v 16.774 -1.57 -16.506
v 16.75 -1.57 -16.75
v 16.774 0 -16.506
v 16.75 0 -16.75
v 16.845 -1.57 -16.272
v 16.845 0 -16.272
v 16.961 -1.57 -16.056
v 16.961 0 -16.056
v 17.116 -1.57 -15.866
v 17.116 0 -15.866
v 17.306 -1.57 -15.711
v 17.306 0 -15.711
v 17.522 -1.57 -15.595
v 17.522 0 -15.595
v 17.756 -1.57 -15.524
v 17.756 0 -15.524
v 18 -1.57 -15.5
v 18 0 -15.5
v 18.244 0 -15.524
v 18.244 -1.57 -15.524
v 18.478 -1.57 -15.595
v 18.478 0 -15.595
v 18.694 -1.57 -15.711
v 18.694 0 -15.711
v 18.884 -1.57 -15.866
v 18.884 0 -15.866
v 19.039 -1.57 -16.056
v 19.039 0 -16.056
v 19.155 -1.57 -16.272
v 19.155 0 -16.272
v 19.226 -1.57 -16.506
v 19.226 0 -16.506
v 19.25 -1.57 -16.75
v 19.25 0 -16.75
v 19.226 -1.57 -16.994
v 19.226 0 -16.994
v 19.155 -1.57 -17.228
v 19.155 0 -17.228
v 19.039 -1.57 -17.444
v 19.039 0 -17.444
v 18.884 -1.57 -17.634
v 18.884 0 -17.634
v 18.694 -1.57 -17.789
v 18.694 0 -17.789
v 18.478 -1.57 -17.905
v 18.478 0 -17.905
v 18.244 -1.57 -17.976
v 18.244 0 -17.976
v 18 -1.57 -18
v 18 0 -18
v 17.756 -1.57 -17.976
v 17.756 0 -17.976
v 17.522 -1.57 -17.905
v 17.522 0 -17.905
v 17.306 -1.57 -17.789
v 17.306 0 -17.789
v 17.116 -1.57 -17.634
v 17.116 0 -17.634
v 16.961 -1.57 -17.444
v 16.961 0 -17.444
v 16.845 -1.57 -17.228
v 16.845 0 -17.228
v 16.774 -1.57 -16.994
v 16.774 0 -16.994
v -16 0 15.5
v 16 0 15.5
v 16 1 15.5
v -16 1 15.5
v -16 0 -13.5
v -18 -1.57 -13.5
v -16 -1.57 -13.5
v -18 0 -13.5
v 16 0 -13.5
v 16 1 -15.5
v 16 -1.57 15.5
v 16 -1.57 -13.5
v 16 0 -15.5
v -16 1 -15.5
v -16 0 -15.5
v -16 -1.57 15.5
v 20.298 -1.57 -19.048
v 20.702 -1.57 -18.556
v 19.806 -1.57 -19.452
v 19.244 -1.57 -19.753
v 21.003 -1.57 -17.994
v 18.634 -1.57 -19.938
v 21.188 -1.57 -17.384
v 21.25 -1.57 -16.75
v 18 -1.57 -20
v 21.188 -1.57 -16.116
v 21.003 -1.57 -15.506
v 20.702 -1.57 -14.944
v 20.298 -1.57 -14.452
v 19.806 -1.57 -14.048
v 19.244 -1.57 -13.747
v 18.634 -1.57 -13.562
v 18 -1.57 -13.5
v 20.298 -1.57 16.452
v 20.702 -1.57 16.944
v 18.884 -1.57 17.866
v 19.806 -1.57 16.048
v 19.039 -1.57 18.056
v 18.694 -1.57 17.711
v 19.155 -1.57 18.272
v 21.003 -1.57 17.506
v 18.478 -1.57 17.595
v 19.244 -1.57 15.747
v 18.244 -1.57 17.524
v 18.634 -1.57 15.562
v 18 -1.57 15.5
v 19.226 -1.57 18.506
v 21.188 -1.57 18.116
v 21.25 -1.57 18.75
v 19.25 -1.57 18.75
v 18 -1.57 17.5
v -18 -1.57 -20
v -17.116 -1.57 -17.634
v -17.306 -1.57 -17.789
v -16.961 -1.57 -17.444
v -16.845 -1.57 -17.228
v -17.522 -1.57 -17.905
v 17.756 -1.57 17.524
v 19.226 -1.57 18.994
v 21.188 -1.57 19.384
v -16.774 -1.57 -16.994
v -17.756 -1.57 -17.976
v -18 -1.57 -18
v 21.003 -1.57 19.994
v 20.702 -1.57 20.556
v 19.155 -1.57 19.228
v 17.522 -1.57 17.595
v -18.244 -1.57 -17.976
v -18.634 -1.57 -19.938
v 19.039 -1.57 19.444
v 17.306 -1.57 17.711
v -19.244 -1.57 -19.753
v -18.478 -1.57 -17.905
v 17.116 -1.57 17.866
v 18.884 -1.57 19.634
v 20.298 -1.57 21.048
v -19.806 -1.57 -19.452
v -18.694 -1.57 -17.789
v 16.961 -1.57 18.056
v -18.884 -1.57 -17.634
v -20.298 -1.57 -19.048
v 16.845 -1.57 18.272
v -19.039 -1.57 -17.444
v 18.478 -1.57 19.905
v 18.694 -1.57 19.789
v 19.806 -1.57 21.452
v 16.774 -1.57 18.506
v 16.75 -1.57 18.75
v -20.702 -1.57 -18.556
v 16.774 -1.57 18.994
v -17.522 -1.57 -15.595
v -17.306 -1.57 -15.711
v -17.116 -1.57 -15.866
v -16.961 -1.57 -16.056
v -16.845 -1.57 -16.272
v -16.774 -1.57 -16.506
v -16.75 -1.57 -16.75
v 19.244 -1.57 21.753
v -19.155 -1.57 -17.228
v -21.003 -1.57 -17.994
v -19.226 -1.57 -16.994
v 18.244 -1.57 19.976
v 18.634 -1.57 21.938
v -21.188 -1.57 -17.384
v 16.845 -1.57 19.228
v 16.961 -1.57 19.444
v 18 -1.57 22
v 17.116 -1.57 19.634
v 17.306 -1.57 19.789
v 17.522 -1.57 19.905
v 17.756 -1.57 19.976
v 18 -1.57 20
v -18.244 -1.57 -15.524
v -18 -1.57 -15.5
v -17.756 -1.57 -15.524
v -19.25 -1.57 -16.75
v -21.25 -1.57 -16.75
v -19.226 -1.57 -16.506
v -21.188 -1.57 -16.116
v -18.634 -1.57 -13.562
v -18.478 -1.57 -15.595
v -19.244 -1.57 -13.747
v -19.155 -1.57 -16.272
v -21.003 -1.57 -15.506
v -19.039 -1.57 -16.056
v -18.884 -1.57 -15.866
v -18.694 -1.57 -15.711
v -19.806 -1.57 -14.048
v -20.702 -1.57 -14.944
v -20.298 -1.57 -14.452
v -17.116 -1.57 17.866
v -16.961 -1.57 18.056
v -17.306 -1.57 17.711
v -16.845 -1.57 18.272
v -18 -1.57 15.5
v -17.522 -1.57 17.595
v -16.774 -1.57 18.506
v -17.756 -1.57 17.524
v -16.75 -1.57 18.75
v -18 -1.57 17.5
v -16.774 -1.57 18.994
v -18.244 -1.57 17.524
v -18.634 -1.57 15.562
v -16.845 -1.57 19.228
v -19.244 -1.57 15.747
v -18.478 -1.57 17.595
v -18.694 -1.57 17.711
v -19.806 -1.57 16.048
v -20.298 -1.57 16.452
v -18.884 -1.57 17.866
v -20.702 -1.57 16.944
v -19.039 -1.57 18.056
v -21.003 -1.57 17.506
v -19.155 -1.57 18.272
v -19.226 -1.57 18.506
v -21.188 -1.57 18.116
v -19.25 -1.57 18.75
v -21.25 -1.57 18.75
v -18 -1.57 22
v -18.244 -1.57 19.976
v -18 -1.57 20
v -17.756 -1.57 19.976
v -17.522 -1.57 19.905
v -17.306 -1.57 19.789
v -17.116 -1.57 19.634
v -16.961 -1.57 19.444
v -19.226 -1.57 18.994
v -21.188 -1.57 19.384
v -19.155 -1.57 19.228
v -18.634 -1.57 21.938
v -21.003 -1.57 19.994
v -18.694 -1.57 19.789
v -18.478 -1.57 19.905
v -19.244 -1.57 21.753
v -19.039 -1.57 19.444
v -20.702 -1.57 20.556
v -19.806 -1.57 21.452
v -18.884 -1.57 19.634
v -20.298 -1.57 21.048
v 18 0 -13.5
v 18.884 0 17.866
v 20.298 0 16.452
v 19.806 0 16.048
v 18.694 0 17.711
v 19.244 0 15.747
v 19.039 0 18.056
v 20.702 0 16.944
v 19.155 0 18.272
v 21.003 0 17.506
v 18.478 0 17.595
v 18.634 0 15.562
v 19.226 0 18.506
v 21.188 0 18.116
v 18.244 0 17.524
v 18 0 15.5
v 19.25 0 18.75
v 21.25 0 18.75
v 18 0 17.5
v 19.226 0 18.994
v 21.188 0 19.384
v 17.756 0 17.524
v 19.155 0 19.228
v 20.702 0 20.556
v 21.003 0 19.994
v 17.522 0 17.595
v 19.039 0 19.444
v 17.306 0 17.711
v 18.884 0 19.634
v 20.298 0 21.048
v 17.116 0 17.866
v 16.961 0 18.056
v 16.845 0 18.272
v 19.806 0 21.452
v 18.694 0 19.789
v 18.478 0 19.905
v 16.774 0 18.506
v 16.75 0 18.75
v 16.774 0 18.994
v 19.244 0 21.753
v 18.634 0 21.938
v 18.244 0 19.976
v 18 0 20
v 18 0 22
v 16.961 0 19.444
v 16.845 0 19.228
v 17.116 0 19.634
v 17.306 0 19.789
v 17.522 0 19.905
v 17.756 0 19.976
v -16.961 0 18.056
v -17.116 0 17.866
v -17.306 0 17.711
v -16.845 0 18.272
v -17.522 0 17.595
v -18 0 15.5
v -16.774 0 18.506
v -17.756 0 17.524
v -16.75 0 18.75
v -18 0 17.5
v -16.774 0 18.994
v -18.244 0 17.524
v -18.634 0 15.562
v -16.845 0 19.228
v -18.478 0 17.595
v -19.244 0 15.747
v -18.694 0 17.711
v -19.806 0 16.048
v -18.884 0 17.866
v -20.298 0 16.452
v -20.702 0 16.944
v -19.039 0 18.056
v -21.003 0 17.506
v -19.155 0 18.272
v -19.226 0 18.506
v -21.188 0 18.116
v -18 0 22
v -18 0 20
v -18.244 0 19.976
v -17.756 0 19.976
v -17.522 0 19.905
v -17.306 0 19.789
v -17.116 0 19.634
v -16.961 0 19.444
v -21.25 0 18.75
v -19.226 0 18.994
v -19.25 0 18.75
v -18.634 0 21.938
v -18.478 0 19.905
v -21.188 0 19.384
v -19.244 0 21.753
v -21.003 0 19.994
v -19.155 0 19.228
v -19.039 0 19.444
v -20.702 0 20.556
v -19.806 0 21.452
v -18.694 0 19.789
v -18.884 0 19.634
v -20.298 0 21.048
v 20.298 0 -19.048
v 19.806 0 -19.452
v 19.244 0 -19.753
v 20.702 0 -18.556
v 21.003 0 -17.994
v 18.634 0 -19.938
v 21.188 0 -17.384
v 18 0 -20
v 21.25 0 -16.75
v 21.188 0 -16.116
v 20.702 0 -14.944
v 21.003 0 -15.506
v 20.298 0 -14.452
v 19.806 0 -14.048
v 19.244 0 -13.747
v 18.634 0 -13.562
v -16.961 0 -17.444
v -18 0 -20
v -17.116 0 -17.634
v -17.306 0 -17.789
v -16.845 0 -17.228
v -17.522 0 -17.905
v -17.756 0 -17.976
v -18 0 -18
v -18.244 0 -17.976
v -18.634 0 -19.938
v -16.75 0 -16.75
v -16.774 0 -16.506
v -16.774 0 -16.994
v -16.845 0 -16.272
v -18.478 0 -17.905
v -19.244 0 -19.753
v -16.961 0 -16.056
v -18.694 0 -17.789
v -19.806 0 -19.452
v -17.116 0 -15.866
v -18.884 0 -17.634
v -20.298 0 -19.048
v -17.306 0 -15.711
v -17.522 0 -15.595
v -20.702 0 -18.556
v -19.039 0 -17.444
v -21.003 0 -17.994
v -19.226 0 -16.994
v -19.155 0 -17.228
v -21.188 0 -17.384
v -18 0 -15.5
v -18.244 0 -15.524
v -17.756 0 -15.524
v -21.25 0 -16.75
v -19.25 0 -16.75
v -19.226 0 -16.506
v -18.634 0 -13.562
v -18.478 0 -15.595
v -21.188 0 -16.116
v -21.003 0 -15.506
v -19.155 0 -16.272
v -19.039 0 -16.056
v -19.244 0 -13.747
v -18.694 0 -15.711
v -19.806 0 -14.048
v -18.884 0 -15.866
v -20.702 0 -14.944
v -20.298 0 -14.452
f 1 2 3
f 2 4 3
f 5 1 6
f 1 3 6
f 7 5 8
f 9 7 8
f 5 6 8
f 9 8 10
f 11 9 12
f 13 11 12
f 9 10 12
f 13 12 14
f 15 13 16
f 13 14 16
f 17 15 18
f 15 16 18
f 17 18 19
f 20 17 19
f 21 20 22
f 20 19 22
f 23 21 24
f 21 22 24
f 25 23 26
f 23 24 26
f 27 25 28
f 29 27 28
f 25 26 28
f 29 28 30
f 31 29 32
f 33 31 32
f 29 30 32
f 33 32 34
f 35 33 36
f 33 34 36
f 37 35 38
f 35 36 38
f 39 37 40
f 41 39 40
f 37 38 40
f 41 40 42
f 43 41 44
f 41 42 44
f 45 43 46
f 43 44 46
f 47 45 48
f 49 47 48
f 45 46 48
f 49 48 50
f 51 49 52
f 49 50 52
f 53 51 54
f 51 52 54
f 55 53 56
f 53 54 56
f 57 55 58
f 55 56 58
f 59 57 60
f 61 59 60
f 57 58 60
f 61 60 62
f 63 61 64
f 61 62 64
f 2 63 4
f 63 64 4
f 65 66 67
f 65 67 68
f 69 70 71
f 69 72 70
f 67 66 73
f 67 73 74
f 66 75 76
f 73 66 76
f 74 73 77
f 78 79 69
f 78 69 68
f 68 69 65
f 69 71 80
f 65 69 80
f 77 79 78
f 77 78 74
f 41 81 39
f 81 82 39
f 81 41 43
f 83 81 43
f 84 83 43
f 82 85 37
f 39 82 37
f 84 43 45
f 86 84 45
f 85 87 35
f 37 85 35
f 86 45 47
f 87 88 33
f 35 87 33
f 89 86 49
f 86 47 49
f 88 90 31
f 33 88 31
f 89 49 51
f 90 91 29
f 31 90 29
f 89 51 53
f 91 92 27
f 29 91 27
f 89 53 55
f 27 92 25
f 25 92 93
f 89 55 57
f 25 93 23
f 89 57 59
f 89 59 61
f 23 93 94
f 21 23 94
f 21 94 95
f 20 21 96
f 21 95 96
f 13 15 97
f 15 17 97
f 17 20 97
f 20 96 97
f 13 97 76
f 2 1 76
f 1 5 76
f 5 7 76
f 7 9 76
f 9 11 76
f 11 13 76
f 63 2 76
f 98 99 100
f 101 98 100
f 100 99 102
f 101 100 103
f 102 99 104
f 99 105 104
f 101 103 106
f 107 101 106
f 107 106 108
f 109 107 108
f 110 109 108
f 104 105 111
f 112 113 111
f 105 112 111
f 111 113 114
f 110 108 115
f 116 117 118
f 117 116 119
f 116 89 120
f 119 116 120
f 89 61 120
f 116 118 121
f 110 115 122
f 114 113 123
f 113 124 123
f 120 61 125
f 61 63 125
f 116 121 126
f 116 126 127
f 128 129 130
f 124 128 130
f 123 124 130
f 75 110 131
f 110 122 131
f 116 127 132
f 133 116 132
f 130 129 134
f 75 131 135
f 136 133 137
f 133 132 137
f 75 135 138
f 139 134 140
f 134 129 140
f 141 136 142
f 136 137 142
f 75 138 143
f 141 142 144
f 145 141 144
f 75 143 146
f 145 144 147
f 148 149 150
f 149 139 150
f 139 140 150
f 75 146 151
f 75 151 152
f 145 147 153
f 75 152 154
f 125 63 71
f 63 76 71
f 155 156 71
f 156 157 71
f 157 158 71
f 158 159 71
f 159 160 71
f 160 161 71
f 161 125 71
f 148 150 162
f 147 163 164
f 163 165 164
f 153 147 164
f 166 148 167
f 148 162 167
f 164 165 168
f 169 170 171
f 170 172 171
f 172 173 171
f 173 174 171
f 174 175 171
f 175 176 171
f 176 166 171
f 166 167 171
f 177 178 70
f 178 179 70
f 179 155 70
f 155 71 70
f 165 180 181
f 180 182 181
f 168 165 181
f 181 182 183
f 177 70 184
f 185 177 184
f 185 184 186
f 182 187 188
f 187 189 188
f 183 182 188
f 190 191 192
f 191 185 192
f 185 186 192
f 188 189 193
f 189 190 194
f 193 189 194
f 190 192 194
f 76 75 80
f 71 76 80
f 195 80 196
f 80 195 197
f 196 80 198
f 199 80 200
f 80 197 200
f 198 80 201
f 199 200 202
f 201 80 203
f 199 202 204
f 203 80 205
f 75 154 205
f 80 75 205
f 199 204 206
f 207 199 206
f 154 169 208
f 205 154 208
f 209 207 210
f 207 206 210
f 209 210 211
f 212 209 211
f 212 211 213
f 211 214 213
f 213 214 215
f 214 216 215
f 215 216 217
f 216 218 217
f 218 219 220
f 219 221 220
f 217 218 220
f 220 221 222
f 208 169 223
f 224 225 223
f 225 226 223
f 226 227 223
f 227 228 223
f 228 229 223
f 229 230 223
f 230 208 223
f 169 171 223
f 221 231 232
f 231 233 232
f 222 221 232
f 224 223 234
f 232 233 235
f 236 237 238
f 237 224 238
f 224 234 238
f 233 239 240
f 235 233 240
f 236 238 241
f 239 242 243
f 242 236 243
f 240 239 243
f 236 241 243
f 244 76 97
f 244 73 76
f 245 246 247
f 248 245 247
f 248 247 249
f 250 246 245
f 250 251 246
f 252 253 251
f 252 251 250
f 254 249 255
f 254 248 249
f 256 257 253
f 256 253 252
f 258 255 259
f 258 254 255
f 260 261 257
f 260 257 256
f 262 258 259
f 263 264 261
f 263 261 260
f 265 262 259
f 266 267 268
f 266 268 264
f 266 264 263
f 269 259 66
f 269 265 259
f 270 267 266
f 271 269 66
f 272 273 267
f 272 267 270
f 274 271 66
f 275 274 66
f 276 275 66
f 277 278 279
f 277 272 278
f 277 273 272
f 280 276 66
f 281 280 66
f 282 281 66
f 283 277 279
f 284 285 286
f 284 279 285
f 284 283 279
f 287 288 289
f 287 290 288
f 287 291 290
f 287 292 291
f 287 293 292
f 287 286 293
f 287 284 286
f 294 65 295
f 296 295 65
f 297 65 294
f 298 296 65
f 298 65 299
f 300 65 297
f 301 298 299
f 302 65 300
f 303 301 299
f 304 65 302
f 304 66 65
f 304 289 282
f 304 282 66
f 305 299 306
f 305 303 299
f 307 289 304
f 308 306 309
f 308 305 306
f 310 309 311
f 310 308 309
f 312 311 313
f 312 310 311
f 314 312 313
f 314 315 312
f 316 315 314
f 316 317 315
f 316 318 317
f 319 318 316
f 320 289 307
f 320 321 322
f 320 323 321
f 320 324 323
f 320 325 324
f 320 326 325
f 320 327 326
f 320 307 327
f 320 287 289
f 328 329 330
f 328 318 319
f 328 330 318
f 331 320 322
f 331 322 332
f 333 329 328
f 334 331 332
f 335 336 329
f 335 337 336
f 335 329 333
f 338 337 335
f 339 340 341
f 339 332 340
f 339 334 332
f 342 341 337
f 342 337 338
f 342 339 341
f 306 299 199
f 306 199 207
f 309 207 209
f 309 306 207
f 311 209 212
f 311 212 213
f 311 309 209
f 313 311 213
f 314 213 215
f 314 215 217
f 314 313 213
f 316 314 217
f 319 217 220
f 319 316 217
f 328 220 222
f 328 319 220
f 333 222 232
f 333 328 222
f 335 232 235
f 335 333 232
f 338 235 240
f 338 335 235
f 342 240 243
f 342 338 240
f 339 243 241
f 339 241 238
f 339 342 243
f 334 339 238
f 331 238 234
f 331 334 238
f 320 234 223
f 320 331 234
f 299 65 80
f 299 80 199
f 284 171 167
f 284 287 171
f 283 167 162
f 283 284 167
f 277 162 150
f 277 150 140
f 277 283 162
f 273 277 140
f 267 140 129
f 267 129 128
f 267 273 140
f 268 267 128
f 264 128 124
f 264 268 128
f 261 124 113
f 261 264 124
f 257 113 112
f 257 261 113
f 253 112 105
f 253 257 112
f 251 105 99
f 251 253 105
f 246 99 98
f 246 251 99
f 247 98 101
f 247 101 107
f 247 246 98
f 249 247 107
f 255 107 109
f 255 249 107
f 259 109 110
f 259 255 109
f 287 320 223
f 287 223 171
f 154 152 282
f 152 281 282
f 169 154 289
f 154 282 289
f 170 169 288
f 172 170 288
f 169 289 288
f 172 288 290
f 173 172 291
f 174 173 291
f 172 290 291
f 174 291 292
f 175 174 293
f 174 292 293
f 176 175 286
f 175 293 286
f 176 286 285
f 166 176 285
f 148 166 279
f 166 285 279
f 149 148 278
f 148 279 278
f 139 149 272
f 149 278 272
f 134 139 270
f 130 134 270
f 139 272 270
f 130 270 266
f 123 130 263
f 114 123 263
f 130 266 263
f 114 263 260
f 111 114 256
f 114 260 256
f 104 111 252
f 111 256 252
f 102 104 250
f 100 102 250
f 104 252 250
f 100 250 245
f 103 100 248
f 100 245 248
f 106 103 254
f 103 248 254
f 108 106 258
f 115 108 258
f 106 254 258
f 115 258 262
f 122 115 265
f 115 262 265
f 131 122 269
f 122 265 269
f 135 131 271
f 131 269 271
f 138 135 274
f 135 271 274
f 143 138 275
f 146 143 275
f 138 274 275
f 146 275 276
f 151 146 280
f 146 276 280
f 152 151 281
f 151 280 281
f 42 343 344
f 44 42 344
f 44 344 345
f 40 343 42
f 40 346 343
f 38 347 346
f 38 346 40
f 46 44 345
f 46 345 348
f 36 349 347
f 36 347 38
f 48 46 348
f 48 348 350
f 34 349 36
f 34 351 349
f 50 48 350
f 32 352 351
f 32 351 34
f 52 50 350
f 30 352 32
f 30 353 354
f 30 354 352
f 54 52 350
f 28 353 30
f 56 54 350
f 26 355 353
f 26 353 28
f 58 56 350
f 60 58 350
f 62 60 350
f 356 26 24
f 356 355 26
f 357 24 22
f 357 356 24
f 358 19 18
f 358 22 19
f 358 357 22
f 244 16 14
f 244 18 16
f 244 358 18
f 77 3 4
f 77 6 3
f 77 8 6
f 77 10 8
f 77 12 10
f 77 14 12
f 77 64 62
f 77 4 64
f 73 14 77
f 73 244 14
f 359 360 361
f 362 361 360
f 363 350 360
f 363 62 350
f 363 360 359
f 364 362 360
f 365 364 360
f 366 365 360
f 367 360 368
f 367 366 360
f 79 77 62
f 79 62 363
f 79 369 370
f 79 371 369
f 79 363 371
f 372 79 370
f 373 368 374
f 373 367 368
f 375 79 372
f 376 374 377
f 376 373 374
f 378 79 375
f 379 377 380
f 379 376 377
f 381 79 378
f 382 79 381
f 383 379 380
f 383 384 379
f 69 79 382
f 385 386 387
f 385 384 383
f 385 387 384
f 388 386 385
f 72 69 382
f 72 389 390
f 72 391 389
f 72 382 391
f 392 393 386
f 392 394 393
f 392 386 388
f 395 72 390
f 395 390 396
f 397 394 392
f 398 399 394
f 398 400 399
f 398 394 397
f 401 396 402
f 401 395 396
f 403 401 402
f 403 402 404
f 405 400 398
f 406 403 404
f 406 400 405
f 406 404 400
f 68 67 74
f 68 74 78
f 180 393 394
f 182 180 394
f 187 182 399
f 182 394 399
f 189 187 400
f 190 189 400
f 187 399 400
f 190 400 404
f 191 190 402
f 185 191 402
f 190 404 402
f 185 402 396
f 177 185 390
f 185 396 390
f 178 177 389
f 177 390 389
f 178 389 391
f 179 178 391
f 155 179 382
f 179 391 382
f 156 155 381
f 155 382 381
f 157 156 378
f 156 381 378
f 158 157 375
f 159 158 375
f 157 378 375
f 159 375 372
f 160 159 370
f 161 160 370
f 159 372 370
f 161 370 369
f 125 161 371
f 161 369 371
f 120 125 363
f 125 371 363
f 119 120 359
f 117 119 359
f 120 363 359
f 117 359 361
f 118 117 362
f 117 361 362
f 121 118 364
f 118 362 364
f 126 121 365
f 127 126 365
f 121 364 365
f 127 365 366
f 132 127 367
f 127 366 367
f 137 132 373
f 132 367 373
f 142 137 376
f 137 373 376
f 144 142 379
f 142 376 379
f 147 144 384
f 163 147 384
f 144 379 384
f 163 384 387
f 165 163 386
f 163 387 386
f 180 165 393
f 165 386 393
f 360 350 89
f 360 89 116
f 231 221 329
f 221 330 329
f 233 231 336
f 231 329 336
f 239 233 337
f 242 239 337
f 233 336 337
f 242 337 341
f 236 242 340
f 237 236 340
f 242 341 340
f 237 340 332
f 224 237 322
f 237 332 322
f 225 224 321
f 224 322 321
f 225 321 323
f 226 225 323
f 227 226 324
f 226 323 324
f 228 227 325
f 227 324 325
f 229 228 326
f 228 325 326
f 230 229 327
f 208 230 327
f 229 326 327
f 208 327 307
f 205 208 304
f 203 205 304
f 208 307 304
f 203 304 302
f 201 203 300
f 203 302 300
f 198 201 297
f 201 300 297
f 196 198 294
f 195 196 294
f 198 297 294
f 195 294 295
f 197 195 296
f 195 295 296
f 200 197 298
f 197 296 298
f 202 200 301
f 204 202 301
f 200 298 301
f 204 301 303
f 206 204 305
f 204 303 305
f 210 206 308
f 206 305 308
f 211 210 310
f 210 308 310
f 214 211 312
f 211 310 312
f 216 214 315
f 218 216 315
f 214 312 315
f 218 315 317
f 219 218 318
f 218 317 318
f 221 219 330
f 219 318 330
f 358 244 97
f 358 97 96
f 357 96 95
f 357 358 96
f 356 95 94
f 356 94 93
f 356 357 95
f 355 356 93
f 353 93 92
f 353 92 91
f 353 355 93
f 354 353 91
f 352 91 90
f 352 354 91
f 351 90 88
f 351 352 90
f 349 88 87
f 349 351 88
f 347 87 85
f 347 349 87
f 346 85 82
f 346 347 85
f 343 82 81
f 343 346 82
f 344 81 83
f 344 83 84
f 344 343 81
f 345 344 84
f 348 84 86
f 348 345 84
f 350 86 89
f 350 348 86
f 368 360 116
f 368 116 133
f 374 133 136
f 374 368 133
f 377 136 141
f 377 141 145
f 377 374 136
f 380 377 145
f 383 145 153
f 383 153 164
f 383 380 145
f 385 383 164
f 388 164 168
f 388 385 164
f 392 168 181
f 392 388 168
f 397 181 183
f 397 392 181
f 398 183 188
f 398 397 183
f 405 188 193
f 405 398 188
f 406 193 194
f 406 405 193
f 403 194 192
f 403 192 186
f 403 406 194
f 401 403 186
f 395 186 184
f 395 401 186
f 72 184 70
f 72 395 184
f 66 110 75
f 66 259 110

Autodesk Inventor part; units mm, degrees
ref_plane "YZ Plane" through (0, 0, 0) normal (1, 0, 0) x (0, 1, 0)
sketch "Sketch1" plane through (0, 0, 0) normal (0, 1, 0) x (-1, 0, 0)
  line L0 (18, 22) -> (-18, 22)
  line L1 (-18, 15.5) -> (-16, 15.5)
  line L2 (-16, 15.5) -> (-16, -15.5)
  line L3 (-16, -13.5) -> (-18, -13.5)
  line L4 (-18, -20) -> (18, -20)
  line L5 (18, -13.5) -> (16, -13.5)
  line L6 (16, -15.5) -> (16, 15.5)
  line L7 (16, 15.5) -> (18, 15.5)
  arc A0 (-18, 22) -> (-18, 15.5) centre (-18, 18.75) ccw
  arc A1 (18, 15.5) -> (18, 22) centre (18, 18.75) ccw
  arc A2 (18, -20) -> (18, -13.5) centre (18, -16.75) ccw
  arc A3 (-18, -13.5) -> (-18, -20) centre (-18, -16.75) ccw
  line L8 (16, -15.5) -> (-16, -15.5)
  line L9 (-16, 15.5) -> (16, 15.5)
  circle A4 centre (18, -16.75) radius 1.25
  circle A5 centre (-18, -16.75) radius 1.25
  circle A6 centre (-18, 18.75) radius 1.25
  circle A7 centre (18, 18.75) radius 1.25
  point P0 (0, 0)
  point P1 (-3.7522, -13.5)
  point P2 (0, 22)
  point P3 (0, -20)
  point P4 (16, 0)
  point P5 (-16, 0)
  point P6 (0, -15.5)
  point P7 (0, 15.5)
  point P8 (0, 22)
  point P9 (-16, 0)
  dimension "d0" = 32
  dimension "d1" = 42
  dimension "d2" = 31
  dimension "d4" = 2.5
  dimension "d6" = 2
  dimension "d7" = 2
extrude "Extrusion1" add sketch "Sketch1" against normal blind 1.57
extrude "Extrusion2" add sketch "Sketch1" along normal blind 1 contours L6 L8 L2 L9
ref_plane "Work Plane1" through (18, 0, 1) normal (0, 0, -1) x (-1, 0, 0)
ref_plane "Work Plane4" through (0, 0, 18.75) normal (-1, 0, 0) x (0, 0, 1)
ref_plane "Work Plane2" through (21.25, 0, 18.75) normal (1, 0, 0) x (0, 0, -1)
ref_plane "Work Plane3" through (-21.25, 0, 18.75) normal (-1, 0, 0) x (0, 0, 1)
ref_plane "Plano de trabajo5" through (-21.25, -1.57, 18.75) normal (-1, 0, 0) x (0, 0, 1)
properties part number "Pantalla" material "Steel, Mild, Welded"
